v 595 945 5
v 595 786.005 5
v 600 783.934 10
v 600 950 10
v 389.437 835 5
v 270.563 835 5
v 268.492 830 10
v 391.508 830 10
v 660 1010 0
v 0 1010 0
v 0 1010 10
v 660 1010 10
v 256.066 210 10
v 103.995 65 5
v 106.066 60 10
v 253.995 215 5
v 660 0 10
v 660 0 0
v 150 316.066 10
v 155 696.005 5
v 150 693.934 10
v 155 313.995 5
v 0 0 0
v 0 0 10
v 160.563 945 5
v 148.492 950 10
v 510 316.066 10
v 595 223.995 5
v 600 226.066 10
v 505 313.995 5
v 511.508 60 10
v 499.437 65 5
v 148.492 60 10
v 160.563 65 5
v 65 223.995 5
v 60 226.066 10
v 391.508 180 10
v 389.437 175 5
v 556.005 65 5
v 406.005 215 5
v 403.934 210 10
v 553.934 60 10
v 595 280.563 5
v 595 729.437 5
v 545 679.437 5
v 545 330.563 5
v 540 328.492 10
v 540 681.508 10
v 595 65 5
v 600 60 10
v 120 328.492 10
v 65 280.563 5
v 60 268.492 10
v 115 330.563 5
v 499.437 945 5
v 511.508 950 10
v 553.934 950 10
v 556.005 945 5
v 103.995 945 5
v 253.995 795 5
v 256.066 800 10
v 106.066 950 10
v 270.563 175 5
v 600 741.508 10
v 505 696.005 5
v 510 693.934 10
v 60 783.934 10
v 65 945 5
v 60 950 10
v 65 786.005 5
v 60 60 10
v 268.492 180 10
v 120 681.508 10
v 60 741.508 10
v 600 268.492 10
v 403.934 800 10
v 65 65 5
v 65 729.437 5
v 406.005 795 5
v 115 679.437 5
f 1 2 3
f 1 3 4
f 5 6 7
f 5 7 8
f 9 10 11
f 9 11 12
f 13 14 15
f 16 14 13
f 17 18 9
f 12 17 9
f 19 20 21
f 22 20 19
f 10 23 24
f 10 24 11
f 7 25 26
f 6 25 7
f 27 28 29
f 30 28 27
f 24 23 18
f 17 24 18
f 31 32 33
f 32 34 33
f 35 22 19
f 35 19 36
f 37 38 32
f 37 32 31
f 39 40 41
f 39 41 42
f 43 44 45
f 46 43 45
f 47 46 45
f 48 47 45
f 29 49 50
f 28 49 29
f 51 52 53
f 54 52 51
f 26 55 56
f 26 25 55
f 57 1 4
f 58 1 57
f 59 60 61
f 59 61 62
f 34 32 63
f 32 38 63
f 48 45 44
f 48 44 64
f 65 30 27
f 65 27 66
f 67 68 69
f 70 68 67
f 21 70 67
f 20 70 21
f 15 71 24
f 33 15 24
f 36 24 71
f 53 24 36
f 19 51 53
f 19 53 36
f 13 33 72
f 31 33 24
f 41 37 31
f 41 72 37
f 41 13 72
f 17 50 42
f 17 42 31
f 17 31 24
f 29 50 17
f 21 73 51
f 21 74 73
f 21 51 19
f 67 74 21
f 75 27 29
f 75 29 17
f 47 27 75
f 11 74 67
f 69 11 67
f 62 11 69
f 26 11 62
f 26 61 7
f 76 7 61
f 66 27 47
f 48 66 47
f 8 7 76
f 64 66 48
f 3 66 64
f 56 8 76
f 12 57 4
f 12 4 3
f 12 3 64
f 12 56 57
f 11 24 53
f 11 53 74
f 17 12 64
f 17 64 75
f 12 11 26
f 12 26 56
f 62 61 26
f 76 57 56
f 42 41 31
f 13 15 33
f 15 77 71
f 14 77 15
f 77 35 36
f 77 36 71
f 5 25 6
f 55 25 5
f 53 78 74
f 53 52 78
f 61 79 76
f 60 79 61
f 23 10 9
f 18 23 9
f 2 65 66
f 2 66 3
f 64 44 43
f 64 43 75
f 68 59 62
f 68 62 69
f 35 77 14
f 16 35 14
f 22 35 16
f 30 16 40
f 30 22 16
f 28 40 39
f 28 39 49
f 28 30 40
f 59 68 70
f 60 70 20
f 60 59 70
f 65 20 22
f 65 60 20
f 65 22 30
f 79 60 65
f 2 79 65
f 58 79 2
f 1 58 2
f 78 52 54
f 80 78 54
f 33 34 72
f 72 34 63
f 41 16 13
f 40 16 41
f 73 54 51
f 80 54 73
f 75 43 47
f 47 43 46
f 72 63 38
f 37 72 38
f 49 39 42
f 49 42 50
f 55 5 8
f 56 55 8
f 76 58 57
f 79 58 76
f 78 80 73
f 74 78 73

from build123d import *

# Parameters (mm, degrees)
ESQUISSE1_W             = 660
ESQUISSE1_H             = 1010
BOSS_EXTRU_1_DEPTH      = 10
ENL_V_MAT_EXTRU_1_DEPTH = 5
CHANFREIN1_SIZE         = 5


with BuildPart() as part:
    # Esquisse1 → Boss.-Extru.1 (new body)
    with BuildSketch(Plane.XY):
        with Locations((330, 505)):
            Rectangle(ESQUISSE1_W, ESQUISSE1_H)
    extrude(amount=BOSS_EXTRU_1_DEPTH)

    # Esquisse2 → Enlèv. mat.-Extru.1 (cut)
    with BuildSketch(Plane.XY.offset(10)):
        Polygon((120, 328.492424049), (120, 681.507575951), (60, 741.507575951), (60, 268.492424049), align=None)
        Polygon((268.492424049, 830), (391.507575951, 830), (511.507575951, 950), (148.492424049, 950), align=None)
        Polygon((60, 950), (60, 783.933982822), (150, 693.933982822), (150, 316.066017178), (60, 226.066017178), (60, 60), (106.066017178, 60), (256.066017178, 210), (403.933982822, 210), (553.933982822, 60), (600, 60), (600, 226.066017178), (510, 316.066017178), (510, 693.933982822), (600, 783.933982822), (600, 950), (553.933982822, 950), (403.933982822, 800), (256.066017178, 800), (106.066017178, 950), align=None)
        Polygon((540, 328.492424049), (540, 681.507575951), (600, 741.507575951), (600, 268.492424049), align=None)
        Polygon((511.507575951, 60), (148.492424049, 60), (268.492424049, 180), (391.507575951, 180), align=None)
    extrude(amount=-ENL_V_MAT_EXTRU_1_DEPTH, mode=Mode.SUBTRACT)

    # Chanfrein1
    chanfrein1_edges = [part.edges().sort_by_distance(p)[0] for p in [
        (330, 60, 5),
        (208.492424049, 120, 5),
        (330, 180, 5),
        (451.507575951, 120, 5),
        (60, 505, 5),
        (90, 711.507575951, 5),
        (120, 505, 5),
        (90, 298.492424049, 5),
        (600, 505, 5),
        (570, 298.492424049, 5),
        (540, 505, 5),
        (570, 711.507575951, 5),
        (181.066017178, 875, 5),
        (330, 800, 5),
        (478.933982822, 875, 5),
        (576.966991411, 950, 5),
        (600, 866.966991411, 5),
        (555, 738.933982822, 5),
        (510, 505, 5),
        (555, 271.066017178, 5),
        (600, 143.033008589, 5),
        (576.966991411, 60, 5),
        (478.933982822, 135, 5),
        (330, 210, 5),
        (181.066017178, 135, 5),
        (83.033008589, 60, 5),
        (60, 143.033008589, 5),
        (105, 271.066017178, 5),
        (150, 505, 5),
        (105, 738.933982822, 5),
        (60, 866.966991411, 5),
        (83.033008589, 950, 5),
        (330, 950, 5),
        (451.507575951, 890, 5),
        (330, 830, 5),
        (208.492424049, 890, 5),
    ]]
    chamfer(chanfrein1_edges, length=CHANFREIN1_SIZE - 0.0001)  # a hair under: the kernel refuses the full size


solid = part.part
